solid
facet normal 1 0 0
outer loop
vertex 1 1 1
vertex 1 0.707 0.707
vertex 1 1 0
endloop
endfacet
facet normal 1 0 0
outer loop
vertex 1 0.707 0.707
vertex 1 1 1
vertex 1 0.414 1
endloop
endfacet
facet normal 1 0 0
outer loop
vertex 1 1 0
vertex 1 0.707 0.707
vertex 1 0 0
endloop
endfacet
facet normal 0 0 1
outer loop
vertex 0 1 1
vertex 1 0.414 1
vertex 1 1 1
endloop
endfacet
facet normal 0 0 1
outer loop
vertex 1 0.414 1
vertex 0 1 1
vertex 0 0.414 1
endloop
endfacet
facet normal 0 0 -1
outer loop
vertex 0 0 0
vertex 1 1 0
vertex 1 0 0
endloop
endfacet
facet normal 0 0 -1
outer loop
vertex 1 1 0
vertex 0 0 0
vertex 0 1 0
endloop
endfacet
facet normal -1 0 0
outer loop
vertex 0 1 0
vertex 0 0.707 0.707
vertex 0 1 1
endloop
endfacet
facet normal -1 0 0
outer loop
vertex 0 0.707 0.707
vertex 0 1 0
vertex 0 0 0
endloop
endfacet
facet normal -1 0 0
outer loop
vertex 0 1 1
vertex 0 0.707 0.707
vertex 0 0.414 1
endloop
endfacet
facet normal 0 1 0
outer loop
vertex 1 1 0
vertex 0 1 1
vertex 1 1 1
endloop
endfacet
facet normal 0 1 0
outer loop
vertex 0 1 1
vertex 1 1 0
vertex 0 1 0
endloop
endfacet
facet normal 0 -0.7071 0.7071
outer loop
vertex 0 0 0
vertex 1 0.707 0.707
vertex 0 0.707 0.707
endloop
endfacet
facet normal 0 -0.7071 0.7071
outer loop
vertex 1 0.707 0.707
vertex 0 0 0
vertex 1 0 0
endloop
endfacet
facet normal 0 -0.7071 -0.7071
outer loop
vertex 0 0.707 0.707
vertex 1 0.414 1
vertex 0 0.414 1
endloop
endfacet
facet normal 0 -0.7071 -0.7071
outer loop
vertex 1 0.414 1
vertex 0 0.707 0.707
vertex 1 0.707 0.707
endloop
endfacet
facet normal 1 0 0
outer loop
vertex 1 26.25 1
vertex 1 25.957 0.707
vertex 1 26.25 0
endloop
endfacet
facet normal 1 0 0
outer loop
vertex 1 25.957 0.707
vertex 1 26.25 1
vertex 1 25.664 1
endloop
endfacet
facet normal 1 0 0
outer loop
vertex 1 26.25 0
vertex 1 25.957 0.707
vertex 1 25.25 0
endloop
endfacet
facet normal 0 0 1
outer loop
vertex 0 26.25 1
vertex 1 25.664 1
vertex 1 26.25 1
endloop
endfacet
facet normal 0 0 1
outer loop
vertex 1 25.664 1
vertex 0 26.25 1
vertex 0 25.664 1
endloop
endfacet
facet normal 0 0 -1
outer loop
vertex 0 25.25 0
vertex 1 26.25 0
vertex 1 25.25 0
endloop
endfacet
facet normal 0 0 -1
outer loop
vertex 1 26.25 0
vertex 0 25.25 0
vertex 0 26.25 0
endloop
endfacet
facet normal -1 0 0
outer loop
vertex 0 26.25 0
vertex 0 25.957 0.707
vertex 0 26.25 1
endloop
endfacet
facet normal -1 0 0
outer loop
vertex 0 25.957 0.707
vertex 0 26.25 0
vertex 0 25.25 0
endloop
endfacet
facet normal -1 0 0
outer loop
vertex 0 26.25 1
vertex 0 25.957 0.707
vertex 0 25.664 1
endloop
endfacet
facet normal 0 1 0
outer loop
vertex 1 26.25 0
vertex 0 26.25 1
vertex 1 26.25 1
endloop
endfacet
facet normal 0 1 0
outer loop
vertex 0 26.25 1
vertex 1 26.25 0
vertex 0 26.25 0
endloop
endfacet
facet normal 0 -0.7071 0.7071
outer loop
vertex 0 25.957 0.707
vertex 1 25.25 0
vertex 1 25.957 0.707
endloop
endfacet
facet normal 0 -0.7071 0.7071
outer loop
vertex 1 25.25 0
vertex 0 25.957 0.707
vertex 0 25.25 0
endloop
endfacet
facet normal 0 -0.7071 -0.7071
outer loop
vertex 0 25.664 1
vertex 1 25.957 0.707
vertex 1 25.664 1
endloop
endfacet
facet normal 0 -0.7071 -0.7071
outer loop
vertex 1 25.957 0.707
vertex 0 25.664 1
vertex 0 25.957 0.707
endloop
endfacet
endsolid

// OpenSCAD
// file: includes/main.scad
if (PART == undef || PART == "socketHolder") {
    socketHolder(); 
} else {
    //This is for creating separate labels 
    for (step = [0 : numOfSteps - 1]) {
        labelY = step * 1.5 * labelSize;
        labelZ = 0;
        //X position is taken care of inside the stepLabels module
        translate([0, labelY, labelZ]) stepLabels(step, angle = 0, includeConnector = true);
    }
}
// file: includes/modules.scad
module socketHolder() {
    difference() {
        steps();
        holes();
        if (!raisedText && includeLabels) {
            integratedLabels();
        }
    }

    if (raisedText && includeLabels) {
        integratedLabels();
    }
}

module steps() {
    for (i = [0 : numOfSteps - 1]) {
        stepY = stepWidthCords[i];
        translate([0, stepY, 0]) step(stepLength, stepWidth[i], stepHeights[i], chamfer);
    }

    module step(sizeX, sizeY, sizeZ, chamferHeighteight) {
        chamferLengthength = sqrt(chamferHeighteight * chamferHeighteight * 2);
        difference() {
            cube([ sizeX, sizeY, sizeZ ]); 
            translate([ -0.1, 0, -chamferHeighteight + sizeZ ]) rotate([ 45, 0, 0 ]) cube([ sizeX + 0.2, chamferLengthength, chamferLengthength ]);
        }
    }
}

module holes() {
    for (step = [0 : numOfSteps - 1]) {
        for (socket = [0:len(socketDiameters[step]) - 1]) {
            // Create holes for the sockets
            posY = 0.5 * (stepWidth[step] + chamfer) + stepWidthCords[step];
            posZ = stepHeights[step] - socketHoleDepths[step][socket];

            // Skip a zero depth socket - zero length sockets used to create gaps
            if (socketHoleDepths[step][socket] != 0) {
                translate([ socketCoords[step][socket], posY, posZ ])
                    cylinder(d = socketDiameters[step][socket] + holeClearance, h = socketHoleDepths[step][socket] + 0.01);
            }

            // Create holes for the magnets
            if (socketHoleDepths[step][socket] != 0) {
                magnetHoleHeight = stepHeights[step] - socketHoleDepths[step][socket] - 1;
                translate([socketCoords[step][socket], posY + magnetOffset, -0.01]) cylinder(d = magnetDiameter + holeClearance, h = magnetHoleHeight);
            }
        }
    }
}

module integratedLabels() {
    for (step = [0 : numOfSteps - 1]) {
        stepY = stepWidthCords[step] + chamferHeight - (chamfer == 0 ? 0 : 1);
        stepZ = chamfer == 0 ? stepHeightCords[step] + 0.5 * stepHeightDeltas[step] : stepHeights[step] - chamferHeight;
        translate([0, stepY, stepZ]) stepLabels(step, angle);
    }
}

module stepLabels(step, angle = 0, includeConnector = false) {
    lastIndex = len(socketDiameters[step]) - 1;
    for (socket = [0 : lastIndex]) {
        letter = socketLabels[step][socket]; 
        if (letter != " ") {
            letterX = socketCoords[step][socket];
            translate([letterX, 0, 0]) rotate([angle, 0, 0]) 
            linear_extrude(height = fontExtrude) 
                text(text = letter, font = "Liberation Sans:style=Bold", size = labelSize, halign = "center", valign = "center");
        }
    }

    if (includeConnector) {
        connectorWidth = chamfer + 1;
        connectorHeight = 1;
        translate([0, -connectorWidth / 2, -connectorHeight]) cube([stepLength, connectorWidth, connectorHeight]);
    }
}
// file: includes/debug.scad
echo("numOfSteps: ", numOfSteps);
echo("socketSpacing: ", socketSpacing);
echo("maxSocketDiameter: ", maxSocketDiameter);
echo("stepWidthAccum: ", stepWidthAccum);
echo("socketCoords: ", socketCoords);
echo("stepLength: ", stepLength);
echo("stepWidth: ", stepWidth);
echo("stepWidthCords: ", stepWidthCords);
echo("minimumStepHeights: ", minimumStepHeights);
echo("stepHeightDeltas: ", stepHeightDeltas);
echo("stepHeights: ", stepHeights);
echo("stepHeightCords: ", stepHeightCords);
echo("socketHoleDepths: ", socketHoleDepths);
echo("angle: ", angle);
echo("includeLabels: ", includeLabels);
echo("fontExtrude: ", fontExtrude);
echo("labelSize: ", labelSize);
echo("magnetThickness: ", magnetThickness);
// file: includes/calculatedValues.scad
$fn = $preview ? 30 : 100;
angle = chamfer == 0 ? 90 : 45;
labelSize = chamfer == 0 ? 8 : chamfer;
chamferLength = sqrt(chamfer * chamfer * 2);
chamferHeight = chamferLength == 0 ? 0 : chamfer * chamfer / chamferLength;
// file: includes/functions.scad
// Sum N elements of an array
function addList(list, l, c = 0) = c < l ? list[c] + addList(list, l, c + 1) : list[c];

// Sum All elments of Array
function addArray(v) = [for (p = v) 1] * v;
// file: includes/comprehensions.scad
//A calculated value many of the comprehensions depend on
numOfSteps = len(socketDiameters);

socketHoleDepths = [
     for (i = [0 : numOfSteps - 1]) [
            for (j = [0 : len(socketDiameters[i]) - 1]) socketHeights[i][j] / 2
        ]
];

// Max socket Diameter for each step - determines step width.
maxSocketDiameter = [for (i = [0 : numOfSteps - 1]) max(socketDiameters[i]) + holeClearance];

//This is a vector of vectors that holds the distance from the start of one socket hole to the start of the next socket hole
//Used to calculate the location of each hole
socketSpacing = [
        for (i = [0 : numOfSteps - 1]) [
            for (j = [0 : len(socketDiameters[i]) - 1]) distanceBetweenHoles + socketDiameters[i][j]
        ]
    ];

// Coordinates of each socket so we know where to place the socket
socketCoords = [ for (b = 0, i = [0 : numOfSteps - 1])
                    [ for (j = [0 : len(socketDiameters[i]) - 1]) j == 0
                                                  ? socketSpacing[i][j] / 2 + stepMargin
                                                  : socketSpacing[i][j] / 2 + stepMargin + addList(socketSpacing[i], j - 1)
                    ]
               ];

//The minimum height a step has to be to fit the socket, magnets, and some extra for clearance
minimumStepHeights = [for (i = [0 : numOfSteps - 1]) max(socketHoleDepths[i]) + magnetThickness + holeClearance];

//The height of each step over the previous one, make sure the next height is at least minimumStepDelta
stepHeightDeltas = [
    for (i = [0 : numOfSteps - 1]) i == 0 ? minimumStepHeights[i] 
                                  : (minimumStepHeights[i] - minimumStepHeights[i - 1] > minimumStepDelta) 
                                    ? minimumStepHeights[i] - minimumStepHeights[i - 1]
                                    : minimumStepDelta
    ];

// The height of each step so we know where to put the socket holes
stepHeights = [for (a = 0, b = stepHeightDeltas[0]; a < len(stepHeightDeltas); a = a + 1, b = b + (stepHeightDeltas[a] == undef ? 0 : stepHeightDeltas[a])) b];

// Cordinates of step Height - so we know where to put text
stepHeightCords = concat(0, stepHeights);

// Width of each step - for buiding steps and to center holes
stepWidth = [
        for (i = [0 : numOfSteps - 1]) chamfer + maxSocketDiameter[i] + 2 * stepMargin
    ];

// Accumlated step width
stepWidthAccum = [
        for (a = 0, b = stepWidth[0]; a < len(stepWidth); a = a + 1, b = b + (stepWidth[a] == undef ? 0 : stepWidth[a])) b
    ];

// Cordinates of step width - for creating steps
stepWidthCords = concat(0, stepWidthAccum);

// Length of the step - take the largest of the socket steps
stepLength = max([for (i = [0:numOfSteps - 1]) addArray(socketSpacing[i])]) + 2 * stepMargin;
// main file
//If you want to use the customizer open this file in OpenSCAD and from the menu choose Window -> Customizer, do not edit this file directly

//Choose "socketHolder" to render the socket holder, you only need to set "labels" if you set includeLabels = false and you are needing to generate the lables 
PART = "socketHolder"; // [socketHolder, labels]

//A vector of socket diameters. Diameter of the holes will be these values + holeClearance
socketDiameters = [ 12, 20 ];

//A vector of how tall each socket is. This is used to calculate socket hole depth which is socketHeight / 2
socketHeights = [
    ];
 
//A vector of the labels for each socket, if the labels overlap increase distanceBetweenHoles 
socketLabels = [ 
    ] ;

//How much space there is between each hole. The less distance between holes the less material it takes to print. This value may need to be increased if the labels overlap (generally only a problem with two double digit fractions in a row on imperial sockets)
distanceBetweenHoles = 4;

//How much space there is between the left/right/bottom/top edges and the holes, it adds 2 * stepMargin to the length of and width of the holder
stepMargin = 2;

//true if you want labels that extrudes from the face, false to have labels that are subtracted
raisedText = true;

//true to include the labels on the model, false to print the labels separately
includeLabels = false; 

//How far the labels are extruded from the face, or embedded into it 
fontExtrude = 2;

//The mininum height increase to the next step, actual height increase may be more if the next step has sockets much deeper than previous step
minimumStepDelta = 10; 

//Height of Chamfer. 0 for no chamfer
chamfer = 8;

//The diameter of the magents you intend to use, actual diameter is magnetDiamter + holeClearance
magnetDiameter = 10; 

//How deep to make the hole for the magnet, this is a minimum, will be deeper if there are deep and short sockets on the same step
magnetThickness = 5;

//How far to offset the magnet from the centre of the socket, this lets the magnet grab the edge of the socket, especially useful for sockets whose connector hole has a bigger diameter than the diameter of the magnets
magnetOffset = 4; 

//How much clearance to add to each socket and magnet hole. In the case of the magnet hole this clearance is applied to both the diameter and depth of the hole
holeClearance = 1.25;

include <./includes/comprehensions.scad>
include <./includes/functions.scad>
include <./includes/calculatedValues.scad>
include <./includes/debug.scad>
include <./includes/modules.scad>
include <./includes/main.scad> //This include kicks off the rendering
